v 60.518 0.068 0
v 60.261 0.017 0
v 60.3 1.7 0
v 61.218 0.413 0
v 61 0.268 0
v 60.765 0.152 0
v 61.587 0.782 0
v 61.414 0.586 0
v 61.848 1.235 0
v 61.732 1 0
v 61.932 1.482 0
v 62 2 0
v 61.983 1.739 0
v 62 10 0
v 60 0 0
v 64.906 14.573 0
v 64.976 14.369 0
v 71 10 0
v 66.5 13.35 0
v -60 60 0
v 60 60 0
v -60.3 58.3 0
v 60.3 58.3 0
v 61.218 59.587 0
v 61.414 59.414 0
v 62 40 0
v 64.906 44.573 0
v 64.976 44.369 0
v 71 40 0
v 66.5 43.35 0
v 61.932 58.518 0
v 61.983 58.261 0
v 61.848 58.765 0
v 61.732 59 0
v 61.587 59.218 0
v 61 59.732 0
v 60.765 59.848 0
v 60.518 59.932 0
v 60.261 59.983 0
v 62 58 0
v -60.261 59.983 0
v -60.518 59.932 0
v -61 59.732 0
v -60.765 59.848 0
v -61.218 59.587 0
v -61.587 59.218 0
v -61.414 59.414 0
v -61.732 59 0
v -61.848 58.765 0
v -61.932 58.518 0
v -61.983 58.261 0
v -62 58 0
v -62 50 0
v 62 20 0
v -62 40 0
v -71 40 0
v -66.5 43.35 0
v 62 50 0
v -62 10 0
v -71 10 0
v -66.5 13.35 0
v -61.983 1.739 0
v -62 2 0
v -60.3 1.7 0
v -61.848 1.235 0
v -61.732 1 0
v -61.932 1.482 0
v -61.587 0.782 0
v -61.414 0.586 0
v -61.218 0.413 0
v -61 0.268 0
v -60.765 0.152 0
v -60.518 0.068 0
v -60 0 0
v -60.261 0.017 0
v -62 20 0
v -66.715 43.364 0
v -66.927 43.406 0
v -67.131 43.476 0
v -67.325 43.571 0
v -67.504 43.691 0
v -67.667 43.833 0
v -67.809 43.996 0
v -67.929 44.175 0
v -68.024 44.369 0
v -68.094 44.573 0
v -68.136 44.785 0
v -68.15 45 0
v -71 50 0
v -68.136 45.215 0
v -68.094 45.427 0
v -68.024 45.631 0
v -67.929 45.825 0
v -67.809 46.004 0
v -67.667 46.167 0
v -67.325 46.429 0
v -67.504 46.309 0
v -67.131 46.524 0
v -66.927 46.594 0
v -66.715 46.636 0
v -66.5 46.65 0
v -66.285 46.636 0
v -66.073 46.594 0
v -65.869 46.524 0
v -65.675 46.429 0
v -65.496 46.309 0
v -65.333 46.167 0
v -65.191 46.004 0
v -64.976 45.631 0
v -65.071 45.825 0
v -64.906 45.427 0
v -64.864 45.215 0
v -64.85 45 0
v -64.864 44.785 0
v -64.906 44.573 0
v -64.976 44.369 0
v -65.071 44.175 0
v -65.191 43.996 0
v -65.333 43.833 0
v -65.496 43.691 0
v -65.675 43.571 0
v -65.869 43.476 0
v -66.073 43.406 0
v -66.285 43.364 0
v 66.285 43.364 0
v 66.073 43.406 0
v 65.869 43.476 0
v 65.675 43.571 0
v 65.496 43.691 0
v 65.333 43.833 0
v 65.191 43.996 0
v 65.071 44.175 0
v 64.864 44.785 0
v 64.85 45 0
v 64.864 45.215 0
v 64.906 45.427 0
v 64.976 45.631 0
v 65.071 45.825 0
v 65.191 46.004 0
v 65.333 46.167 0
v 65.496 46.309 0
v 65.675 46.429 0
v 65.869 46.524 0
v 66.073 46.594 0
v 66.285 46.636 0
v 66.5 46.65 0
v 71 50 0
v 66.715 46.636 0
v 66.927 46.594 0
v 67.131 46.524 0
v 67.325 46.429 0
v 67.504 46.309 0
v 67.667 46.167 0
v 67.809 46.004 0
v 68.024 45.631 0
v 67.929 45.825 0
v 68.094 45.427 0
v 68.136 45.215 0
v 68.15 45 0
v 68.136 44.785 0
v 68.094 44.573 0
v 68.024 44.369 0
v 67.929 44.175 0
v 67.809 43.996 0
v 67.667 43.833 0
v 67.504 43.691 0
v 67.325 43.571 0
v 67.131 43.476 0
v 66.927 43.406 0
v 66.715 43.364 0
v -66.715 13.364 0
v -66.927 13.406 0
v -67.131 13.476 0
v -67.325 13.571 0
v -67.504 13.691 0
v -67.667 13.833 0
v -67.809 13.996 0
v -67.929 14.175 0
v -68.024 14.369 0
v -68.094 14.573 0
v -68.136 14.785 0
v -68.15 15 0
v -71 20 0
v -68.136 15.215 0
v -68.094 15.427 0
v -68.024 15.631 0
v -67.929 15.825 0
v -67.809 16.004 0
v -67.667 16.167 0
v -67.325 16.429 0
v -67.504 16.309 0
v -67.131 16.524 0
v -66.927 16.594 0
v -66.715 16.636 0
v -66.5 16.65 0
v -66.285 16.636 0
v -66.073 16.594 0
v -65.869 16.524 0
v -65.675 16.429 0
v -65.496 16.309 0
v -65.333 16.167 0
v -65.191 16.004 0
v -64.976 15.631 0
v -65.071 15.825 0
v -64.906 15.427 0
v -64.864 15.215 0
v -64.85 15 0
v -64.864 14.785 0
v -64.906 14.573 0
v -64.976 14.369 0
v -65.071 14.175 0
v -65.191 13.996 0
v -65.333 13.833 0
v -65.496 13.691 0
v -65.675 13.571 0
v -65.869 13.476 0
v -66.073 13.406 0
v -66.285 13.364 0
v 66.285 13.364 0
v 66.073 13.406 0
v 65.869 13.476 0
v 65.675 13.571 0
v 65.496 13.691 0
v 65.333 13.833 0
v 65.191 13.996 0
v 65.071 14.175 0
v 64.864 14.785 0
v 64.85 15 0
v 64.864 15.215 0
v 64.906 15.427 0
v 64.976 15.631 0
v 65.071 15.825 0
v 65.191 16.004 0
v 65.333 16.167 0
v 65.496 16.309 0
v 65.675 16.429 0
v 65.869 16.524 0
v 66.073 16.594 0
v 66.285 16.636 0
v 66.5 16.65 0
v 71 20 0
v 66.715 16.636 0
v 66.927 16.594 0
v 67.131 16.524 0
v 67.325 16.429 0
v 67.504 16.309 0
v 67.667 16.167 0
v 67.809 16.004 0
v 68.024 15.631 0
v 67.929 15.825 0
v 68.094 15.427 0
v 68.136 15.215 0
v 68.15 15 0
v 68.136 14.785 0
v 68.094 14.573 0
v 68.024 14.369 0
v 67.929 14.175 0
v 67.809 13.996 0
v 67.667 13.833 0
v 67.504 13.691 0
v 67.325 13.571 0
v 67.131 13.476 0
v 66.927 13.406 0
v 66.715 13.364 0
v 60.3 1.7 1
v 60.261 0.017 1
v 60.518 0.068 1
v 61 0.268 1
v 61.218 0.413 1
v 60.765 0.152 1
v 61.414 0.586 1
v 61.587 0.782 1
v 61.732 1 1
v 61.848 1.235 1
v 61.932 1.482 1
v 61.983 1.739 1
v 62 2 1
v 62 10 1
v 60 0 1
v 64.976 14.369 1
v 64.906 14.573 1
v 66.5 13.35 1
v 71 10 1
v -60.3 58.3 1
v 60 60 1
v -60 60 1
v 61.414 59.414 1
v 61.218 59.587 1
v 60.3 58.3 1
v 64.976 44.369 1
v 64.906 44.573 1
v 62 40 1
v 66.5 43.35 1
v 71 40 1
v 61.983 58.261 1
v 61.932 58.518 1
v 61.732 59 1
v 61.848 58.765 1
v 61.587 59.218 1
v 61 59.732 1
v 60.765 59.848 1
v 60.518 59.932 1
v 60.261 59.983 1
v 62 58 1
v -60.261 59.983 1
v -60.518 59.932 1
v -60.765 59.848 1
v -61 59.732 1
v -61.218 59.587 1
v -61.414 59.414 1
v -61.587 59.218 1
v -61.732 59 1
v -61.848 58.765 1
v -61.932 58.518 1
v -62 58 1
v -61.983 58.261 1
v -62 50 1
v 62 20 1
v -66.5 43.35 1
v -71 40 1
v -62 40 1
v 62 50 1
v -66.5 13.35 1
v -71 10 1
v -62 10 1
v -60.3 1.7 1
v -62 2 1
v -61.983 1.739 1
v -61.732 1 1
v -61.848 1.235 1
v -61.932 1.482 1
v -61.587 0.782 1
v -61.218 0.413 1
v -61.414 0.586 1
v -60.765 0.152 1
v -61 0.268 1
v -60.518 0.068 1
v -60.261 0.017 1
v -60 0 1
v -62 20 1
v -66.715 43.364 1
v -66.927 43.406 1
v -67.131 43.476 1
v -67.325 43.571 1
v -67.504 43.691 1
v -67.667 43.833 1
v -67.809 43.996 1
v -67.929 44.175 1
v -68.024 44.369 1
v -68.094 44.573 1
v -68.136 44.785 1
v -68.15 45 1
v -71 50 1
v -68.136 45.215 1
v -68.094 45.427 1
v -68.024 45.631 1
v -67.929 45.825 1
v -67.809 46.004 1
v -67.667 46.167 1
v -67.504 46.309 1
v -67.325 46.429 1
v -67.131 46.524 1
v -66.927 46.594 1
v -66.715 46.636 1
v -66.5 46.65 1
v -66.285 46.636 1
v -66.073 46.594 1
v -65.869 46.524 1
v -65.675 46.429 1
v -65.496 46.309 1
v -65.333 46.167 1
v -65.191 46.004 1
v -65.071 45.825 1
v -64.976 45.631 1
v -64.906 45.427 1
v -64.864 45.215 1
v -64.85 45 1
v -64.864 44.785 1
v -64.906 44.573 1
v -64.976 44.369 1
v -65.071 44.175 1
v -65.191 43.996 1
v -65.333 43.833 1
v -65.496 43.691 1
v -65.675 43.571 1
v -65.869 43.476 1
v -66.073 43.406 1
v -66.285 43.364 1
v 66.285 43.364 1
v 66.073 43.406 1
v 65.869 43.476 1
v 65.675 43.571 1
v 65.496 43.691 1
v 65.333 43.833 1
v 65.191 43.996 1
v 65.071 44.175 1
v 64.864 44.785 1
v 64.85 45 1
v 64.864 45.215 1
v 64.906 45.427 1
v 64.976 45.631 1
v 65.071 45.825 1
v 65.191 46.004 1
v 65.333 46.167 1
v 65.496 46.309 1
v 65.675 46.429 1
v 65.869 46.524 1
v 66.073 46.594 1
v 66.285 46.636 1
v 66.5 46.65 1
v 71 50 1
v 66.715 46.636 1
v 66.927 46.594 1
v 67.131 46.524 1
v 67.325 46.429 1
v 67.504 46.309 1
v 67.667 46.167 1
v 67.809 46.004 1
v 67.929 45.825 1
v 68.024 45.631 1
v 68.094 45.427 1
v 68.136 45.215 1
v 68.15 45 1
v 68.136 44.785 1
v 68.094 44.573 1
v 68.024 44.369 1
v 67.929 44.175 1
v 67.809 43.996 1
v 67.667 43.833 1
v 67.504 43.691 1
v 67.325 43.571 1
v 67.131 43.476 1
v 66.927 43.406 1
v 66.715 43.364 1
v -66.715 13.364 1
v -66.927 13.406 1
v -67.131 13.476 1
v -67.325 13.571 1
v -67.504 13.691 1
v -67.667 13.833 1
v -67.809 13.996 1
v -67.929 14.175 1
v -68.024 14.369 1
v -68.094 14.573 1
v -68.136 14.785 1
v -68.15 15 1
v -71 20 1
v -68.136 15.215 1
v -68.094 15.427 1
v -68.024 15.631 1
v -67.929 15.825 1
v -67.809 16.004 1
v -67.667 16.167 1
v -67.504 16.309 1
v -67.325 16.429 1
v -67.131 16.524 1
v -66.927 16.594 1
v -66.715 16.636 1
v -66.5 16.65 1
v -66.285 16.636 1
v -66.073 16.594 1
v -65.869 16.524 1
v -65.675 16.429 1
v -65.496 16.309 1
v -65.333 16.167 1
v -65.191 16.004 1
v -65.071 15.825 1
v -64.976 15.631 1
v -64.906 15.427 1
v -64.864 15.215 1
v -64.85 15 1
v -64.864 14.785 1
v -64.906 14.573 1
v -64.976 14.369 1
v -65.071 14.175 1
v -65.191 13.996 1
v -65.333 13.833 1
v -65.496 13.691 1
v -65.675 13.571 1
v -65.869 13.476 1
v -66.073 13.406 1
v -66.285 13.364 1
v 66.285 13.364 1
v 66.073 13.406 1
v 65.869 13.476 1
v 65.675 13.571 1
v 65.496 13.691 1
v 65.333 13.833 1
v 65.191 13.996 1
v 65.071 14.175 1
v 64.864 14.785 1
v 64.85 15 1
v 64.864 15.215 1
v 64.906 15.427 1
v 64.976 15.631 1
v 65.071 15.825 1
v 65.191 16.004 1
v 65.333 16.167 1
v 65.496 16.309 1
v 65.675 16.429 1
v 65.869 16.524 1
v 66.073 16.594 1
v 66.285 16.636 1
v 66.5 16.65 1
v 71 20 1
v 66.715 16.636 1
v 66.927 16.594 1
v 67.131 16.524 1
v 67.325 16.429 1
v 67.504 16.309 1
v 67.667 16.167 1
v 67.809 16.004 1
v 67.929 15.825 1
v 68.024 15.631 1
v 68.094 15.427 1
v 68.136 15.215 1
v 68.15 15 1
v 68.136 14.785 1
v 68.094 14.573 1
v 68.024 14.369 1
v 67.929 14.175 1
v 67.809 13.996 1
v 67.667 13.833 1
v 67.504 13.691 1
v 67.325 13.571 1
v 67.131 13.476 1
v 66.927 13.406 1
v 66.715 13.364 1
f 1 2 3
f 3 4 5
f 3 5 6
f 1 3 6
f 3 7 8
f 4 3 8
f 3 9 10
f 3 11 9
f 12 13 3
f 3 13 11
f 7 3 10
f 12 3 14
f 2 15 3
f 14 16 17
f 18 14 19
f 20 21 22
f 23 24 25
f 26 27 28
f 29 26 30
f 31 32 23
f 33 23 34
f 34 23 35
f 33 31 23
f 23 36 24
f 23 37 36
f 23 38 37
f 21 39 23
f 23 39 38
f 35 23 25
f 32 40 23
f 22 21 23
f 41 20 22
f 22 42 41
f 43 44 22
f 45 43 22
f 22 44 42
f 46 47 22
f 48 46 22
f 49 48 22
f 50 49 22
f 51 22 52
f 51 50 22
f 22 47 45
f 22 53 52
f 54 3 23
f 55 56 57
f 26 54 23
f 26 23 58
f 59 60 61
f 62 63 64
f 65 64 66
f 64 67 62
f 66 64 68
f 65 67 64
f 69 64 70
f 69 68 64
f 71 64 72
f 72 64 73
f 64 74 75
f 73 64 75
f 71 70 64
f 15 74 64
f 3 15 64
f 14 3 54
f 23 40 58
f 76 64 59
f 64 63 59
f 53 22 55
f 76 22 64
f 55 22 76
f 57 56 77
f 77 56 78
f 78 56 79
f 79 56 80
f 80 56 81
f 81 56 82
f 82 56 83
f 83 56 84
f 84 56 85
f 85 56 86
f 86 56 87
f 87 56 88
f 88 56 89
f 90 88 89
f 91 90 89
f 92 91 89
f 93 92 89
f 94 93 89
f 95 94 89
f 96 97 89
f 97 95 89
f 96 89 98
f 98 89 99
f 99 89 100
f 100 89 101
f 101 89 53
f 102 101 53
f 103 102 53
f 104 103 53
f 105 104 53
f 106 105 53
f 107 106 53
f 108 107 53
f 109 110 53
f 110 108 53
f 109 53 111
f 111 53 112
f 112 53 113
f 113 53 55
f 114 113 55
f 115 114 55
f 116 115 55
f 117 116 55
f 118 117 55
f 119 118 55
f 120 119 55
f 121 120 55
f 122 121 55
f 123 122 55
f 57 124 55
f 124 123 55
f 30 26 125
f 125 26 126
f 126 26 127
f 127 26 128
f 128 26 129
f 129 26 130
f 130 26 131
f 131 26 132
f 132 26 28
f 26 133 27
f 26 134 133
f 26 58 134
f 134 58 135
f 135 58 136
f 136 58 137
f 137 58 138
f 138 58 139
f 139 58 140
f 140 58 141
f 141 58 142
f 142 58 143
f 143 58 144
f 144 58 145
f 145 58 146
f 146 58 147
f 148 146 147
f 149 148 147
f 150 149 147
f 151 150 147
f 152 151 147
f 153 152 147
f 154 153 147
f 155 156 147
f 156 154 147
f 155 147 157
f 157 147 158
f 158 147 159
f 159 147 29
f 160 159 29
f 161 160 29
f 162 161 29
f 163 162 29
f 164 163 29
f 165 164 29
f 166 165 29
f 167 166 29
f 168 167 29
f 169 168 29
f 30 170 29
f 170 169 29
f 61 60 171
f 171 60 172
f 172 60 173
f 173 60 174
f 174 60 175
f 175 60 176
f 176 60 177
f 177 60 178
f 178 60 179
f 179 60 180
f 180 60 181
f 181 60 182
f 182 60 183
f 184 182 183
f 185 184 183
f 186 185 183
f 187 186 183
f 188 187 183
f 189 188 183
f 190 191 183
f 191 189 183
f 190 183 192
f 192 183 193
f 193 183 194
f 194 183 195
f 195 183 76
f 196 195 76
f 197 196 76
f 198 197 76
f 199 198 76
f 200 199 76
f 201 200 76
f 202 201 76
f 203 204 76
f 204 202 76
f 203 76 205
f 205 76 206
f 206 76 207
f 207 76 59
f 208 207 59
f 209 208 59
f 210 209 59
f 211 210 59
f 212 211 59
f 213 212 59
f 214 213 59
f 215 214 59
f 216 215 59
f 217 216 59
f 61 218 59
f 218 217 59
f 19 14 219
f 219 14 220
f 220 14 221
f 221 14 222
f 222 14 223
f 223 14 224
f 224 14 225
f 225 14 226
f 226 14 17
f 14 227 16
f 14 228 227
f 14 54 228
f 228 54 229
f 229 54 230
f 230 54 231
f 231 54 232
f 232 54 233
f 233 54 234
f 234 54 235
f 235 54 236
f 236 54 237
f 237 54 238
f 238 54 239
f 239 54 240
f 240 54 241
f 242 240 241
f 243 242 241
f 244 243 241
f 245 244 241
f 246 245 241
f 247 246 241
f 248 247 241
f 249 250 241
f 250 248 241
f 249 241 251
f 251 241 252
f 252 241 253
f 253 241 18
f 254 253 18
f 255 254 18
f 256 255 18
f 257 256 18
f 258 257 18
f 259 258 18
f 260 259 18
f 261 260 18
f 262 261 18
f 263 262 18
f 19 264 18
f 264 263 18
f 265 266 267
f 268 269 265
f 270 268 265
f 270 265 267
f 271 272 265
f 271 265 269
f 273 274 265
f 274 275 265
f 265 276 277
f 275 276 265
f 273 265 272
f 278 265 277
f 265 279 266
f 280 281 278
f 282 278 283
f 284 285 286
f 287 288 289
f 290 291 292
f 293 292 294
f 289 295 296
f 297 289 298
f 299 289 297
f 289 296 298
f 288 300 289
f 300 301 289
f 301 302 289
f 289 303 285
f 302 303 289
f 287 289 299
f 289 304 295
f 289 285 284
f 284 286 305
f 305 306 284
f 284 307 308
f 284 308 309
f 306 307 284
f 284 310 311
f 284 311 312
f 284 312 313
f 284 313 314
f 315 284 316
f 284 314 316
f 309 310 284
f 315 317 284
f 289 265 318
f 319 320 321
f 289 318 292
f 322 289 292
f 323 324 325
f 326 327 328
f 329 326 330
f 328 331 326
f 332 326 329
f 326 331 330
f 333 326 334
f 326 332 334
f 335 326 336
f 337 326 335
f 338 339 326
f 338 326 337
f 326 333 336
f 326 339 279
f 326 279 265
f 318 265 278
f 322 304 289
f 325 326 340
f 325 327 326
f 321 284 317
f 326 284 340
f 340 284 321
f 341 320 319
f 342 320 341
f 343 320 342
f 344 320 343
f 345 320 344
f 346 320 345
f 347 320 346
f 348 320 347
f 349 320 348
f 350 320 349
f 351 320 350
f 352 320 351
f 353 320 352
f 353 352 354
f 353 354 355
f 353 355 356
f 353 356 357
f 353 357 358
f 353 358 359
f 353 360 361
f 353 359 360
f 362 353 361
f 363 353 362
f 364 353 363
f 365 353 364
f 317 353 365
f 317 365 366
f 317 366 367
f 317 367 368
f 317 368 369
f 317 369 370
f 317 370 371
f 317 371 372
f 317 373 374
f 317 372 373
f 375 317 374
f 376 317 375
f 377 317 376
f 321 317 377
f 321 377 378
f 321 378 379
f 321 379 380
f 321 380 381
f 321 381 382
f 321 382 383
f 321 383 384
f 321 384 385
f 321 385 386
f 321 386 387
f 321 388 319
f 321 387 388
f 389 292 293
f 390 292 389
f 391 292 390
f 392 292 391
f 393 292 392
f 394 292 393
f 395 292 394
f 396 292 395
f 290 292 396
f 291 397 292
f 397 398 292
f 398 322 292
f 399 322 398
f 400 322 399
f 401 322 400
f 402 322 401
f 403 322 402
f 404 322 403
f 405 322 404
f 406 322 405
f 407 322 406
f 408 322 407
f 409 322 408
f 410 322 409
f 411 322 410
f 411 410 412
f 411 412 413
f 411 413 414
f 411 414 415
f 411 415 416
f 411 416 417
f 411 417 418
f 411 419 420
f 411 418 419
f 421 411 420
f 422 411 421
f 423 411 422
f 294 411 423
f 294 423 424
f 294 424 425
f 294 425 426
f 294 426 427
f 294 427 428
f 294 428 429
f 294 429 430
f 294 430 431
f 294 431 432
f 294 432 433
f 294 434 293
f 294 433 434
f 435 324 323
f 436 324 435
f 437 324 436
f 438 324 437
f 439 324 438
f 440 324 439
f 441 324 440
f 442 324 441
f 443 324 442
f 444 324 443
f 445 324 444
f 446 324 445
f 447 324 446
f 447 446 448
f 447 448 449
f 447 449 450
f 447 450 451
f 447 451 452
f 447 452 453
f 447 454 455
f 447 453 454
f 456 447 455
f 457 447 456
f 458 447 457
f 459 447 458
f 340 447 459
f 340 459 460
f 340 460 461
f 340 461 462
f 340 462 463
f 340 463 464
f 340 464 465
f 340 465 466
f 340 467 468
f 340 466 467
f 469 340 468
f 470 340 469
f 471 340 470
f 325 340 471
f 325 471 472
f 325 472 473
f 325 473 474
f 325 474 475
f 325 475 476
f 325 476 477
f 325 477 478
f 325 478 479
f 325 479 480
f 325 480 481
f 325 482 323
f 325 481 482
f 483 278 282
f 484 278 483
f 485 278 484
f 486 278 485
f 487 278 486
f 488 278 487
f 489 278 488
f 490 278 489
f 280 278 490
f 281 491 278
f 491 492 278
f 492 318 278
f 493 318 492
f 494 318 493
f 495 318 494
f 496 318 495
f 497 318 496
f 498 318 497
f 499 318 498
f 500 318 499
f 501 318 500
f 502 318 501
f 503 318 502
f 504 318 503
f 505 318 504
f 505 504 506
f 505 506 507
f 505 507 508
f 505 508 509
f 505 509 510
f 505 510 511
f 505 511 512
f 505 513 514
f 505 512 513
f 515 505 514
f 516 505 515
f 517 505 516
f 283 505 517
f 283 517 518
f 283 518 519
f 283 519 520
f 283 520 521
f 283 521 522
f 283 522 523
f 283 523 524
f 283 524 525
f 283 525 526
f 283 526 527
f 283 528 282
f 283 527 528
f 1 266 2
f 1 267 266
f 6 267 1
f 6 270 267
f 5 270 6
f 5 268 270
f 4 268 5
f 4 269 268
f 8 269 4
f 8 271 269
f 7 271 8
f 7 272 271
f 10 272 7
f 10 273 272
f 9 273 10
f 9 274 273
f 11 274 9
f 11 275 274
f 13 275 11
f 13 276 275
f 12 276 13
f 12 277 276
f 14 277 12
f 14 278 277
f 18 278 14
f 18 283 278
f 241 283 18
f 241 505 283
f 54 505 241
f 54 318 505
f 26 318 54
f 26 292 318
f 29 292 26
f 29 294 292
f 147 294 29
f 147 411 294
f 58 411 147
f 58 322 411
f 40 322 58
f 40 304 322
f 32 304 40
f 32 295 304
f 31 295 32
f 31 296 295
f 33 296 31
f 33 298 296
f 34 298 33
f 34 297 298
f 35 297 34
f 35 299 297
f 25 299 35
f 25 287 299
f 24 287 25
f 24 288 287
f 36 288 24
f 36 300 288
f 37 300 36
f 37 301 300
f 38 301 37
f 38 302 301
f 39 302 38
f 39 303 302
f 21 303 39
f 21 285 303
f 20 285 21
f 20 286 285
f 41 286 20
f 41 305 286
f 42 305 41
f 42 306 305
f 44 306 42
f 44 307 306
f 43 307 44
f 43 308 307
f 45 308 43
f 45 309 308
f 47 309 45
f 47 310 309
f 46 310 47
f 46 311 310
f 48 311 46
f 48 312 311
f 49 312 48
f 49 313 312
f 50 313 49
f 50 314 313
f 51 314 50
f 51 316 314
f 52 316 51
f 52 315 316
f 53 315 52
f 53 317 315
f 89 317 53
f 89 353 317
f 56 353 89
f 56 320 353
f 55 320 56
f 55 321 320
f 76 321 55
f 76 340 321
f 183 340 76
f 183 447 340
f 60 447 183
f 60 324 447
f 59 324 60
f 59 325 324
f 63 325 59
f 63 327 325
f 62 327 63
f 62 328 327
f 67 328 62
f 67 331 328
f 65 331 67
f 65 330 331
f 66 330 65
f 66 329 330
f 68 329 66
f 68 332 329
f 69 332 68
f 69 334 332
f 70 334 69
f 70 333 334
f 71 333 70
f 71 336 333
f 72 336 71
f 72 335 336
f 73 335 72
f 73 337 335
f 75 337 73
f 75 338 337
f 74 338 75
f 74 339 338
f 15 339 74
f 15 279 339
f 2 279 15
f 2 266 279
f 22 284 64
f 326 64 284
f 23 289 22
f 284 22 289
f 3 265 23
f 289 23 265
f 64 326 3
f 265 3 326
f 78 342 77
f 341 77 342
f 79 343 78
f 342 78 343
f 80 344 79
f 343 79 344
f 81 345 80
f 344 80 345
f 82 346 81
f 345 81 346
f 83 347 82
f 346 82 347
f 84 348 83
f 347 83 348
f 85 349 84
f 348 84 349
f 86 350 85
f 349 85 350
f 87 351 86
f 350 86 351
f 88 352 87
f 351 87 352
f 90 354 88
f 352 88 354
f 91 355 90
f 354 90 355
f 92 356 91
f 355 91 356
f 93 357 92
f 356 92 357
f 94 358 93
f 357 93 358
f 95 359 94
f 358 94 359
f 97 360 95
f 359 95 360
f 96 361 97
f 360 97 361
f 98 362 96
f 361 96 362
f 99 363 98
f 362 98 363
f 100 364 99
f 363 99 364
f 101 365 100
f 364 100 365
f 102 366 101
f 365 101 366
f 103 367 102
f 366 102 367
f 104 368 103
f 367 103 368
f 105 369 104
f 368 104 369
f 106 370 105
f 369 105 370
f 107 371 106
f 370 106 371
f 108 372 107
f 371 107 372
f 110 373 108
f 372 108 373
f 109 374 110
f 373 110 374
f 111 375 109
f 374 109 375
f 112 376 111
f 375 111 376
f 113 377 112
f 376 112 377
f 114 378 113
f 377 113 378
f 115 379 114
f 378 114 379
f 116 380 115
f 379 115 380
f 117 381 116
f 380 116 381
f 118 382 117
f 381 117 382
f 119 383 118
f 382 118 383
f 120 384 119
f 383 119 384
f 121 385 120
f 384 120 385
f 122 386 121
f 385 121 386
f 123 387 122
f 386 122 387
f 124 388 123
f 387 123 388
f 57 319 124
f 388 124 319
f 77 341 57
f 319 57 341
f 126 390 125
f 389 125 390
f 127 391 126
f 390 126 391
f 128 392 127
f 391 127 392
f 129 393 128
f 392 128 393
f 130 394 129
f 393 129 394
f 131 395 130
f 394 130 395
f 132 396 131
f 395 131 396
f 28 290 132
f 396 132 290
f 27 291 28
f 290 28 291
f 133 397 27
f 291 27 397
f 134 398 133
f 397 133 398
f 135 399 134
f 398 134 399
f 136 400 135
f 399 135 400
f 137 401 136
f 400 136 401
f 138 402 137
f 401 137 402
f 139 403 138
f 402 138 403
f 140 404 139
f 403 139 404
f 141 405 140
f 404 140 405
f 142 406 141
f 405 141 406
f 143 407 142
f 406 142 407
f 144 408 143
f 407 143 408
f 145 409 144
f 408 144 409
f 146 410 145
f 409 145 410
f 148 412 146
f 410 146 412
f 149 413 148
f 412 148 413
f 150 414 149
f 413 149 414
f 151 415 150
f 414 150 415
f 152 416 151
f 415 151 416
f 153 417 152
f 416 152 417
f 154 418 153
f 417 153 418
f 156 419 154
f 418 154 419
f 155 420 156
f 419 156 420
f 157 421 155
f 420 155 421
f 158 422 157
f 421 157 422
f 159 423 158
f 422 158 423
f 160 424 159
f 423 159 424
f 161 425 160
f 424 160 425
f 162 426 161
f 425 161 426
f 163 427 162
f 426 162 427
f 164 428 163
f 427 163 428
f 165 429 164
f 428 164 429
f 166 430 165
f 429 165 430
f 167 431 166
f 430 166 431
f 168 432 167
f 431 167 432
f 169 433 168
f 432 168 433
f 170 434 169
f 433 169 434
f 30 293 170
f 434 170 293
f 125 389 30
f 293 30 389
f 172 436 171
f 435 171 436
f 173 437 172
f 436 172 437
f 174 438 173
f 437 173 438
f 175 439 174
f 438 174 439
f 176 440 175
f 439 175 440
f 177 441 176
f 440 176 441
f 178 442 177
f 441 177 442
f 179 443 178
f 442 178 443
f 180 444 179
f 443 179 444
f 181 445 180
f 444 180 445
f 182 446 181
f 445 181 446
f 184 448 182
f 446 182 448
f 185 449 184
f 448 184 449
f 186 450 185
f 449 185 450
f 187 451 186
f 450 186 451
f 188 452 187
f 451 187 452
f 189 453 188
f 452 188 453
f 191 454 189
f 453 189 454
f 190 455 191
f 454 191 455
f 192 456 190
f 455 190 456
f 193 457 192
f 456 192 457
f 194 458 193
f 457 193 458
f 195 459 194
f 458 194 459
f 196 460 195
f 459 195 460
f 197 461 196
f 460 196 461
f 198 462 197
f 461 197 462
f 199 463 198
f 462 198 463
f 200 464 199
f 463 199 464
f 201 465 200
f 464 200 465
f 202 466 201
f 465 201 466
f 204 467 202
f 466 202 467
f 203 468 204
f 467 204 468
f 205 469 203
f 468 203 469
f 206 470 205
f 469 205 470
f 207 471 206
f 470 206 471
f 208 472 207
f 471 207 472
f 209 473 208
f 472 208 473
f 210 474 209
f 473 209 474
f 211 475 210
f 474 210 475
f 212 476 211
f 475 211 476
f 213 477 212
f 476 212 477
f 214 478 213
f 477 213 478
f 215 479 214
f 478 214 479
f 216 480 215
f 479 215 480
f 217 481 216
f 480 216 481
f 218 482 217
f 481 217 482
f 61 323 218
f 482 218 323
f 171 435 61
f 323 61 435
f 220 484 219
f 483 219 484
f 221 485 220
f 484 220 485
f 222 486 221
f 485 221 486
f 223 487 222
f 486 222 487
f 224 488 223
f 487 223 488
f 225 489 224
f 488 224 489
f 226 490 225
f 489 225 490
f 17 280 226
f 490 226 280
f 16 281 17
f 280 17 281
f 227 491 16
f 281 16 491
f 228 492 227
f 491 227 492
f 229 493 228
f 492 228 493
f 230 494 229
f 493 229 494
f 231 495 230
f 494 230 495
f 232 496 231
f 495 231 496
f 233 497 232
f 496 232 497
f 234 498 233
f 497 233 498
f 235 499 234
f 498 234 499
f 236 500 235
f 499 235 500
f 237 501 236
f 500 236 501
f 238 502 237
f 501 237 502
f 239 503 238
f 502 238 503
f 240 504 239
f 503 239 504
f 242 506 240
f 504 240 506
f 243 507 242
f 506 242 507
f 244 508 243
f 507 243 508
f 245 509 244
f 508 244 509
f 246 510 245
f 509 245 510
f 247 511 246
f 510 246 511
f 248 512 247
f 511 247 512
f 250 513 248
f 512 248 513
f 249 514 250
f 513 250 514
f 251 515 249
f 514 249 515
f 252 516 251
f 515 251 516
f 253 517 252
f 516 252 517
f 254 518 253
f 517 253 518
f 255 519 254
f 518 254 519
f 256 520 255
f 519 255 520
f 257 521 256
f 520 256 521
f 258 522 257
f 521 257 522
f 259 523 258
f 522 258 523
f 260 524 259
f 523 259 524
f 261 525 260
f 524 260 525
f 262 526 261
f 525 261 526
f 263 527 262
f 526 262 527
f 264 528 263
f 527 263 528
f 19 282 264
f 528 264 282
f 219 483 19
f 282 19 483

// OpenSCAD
// file: lunchbox.params.scad
// SPDX-FileCopyrightText: 2026 Alon A. Rabinowitz
// SPDX-License-Identifier: CC-BY-SA-4.0
// A remix of LunchBox by GekoPrime (https://www.printables.com/model/468166), CC BY-SA 4.0.

/*
Everything you SET for the LunchBox remix. Render lunchbox.scad, not this file.

The LunchBox is a carbon + HEPA scrubber. Air enters the grid on the body's front and passes the HEPA paper,
then the carbon bed between two perforated walls. It goes down a channel at the back to the fan section
underneath, whose fans blow it out at the front. This remix adds, for a build with two 40 x 40 x 20 fans
(Delta EFB0412VHD):

  insert      a drop-in section between the body and the fan section, holding a flat filter sheet that
              stops carbon dust reaching the fans. It mates with the unmodified parts on both faces.
  gaskets     flat TPU, one for the lid joint and one for each joint at the fans.
  blank       closes the fan section's middle bay.
  tabs        two per short end at every joint, clamped with an M3 screw and a nut in a side slot. The
              body, the lid and the fan section get them added to the original STLs.

COORDINATES are the box as it stands: X along its length, Y from the front (the grid, where air comes in)
to the back, Z up, with Z = 0 at the joint between the body and the fan section. X is centred.

The original's STLs use a different frame (Z points down, Y from the front towards -Y) and are not in
this repository; lunchbox.layout.scad maps them into this one. Download them from the Printables page into
original/ - see the README there.
*/

/* [Which part] */
part = "insert";   /* "insert", "gasket-lid", "gasket-fans", "blank", "body", "lid" or "fans". The last three are the originals with tabs added, and need original/. lunchbox-assembly.scad shows them together. */
insert_tabs = true;   /* false makes the insert a plain drop-in, for a LunchBox built without tabs. */
/* [The original LunchBox - measured by sectioning its STLs, 6-7 Oct 2026] */
// All MEASURED: horizontal sections of filter_caddy_110x74x21.stl (the body), filter_lid_110x74x21.stl and
// axial_fan_caddy_40x28.stl (the fan section), read to 0.1 mm. The originals agree with each other to that
// precision (the outlines are identical), so the numbers are the author's design values.
lb_l    = 124;      /* Outside length (X). */
lb_d    = 60;       /* Outside depth (Y). */
lb_r    = 2;        /* The outline's corner radius. */
lb_wall = 2;        /* The body's wall; the lid's plug fills the inside of it, 120 x 56. */
body_h  = 117.43;   /* The body, from the fan joint to the lid joint. */
lid_t   = 2;        /* The lid's plate. Its plug, lid_t more, sits inside the body's top. */
lid_screw_ys = [5, 55];   /* The lid's own two screws, at X = 0. They stay. */
groove_w = 2.6;     /* The channel in the body's bottom face, inside its wall, that the fan section's lip seats in... */
groove_h = 2;       /* ...and its depth. */
hepa_hw  = 55;      /* The HEPA holder's opening in the body's bottom face: X +/-55, from the wall to Y = hepa_y1. */
hepa_y1  = 23;
cap_y1   = 41.1;    /* The carbon bed's floor, at the body's bottom face, ends here; behind it is the channel that takes the air down to the fans. */
fans_h   = 44.6;    /* The fan section, from its bottom to the rim the body sits on. Its lip stands groove_h higher. */
fans_floor = 4;     /* The fan section's floor, under the fans. */
fan_slot_hw = 60.3; /* The slot the three fans stand in, side by side: X +/-60.3 ... */
fan_slot_y1 = 30.6; /* ...from the front wall (Y = lb_wall) to here, where the walls step in. Behind it, the plenum with its curved floor. */
plenum_hw   = 58;   /* The plenum's opening in the rim, X +/-58, from fan_slot_y1 to lip_back_y0. */
lip_t_side  = 1.7;  /* The fan section's lip: along each side, X 58 to 59.7, from fan_slot_y1 back... */
lip_back_y0 = 55.7; /* ...and across the back, Y 55.7 to 57.7, its two outer corners rounded to lb_r. It rises groove_h above the rim. */
lip_t_back  = 2;

/* [The insert and its filter sheet] */
sheet_t  = 5;       /* The space the sheet lies in. Polyester filter floss, about 5 mm loose; it is not compressed. */
plenum_h = 5;       /* Free air above the sheet: the channel is only 14 mm deep, and this lets its air spread forward over the whole sheet. */
grid_t   = 2;       /* The grid the sheet lies on. */
grid_pitch = 10;    /* Ribs along Y, this far apart; two more ribs cross them along X. */
grid_beads = 2;     /* Each rib is this many beads wide. */
ledge_beads = 3;    /* A ledge round the cavity at the grid's level: the ribs end on it, and the sheet's edges seal on it. */

/* [The gaskets - TPU] */
gasket_t = 1.0;     /* Five layers. Every joint's stack height counts it, uncompressed. */

/* [The tabs and their screws] */
tab_ys    = [15, 45];   /* The two tabs on each short end, by Y. Alon, Q81, 7 Oct 2026: two per side. */
tab_l     = 9;      /* How far a tab stands out from the end wall. */
tab_w     = 10;     /* Its width, along Y. */
tab_t     = 6;      /* Its height, on the body and the fan section. The lid's tab is the lid's plate. */
tab_axis  = 4.5;    /* The screw, this far out from the end wall: the nut's slot then stops about 1 mm short of it. */
screw_d   = 3.0;    /* M3. */
nut_af    = 5.5;    /* The M3 hex nut, across its flats - ISO 4032... */
nut_h     = 2.4;    /* ...and its height, the largest allowed. */
nut_fit   = 0.15;   /* The nut's side slot, per side, on top of fdm_hole_comp: the nut slides in and the screw holds it. */
screw_tip = 1.5;    /* A screw must stand this far out of its nut. */
screw_lengths = [8, 10, 12, 16, 20, 25, 30, 35, 40];   /* M3 lengths to choose from. */

/* [The blank for the middle bay] */
blank_fit = 0.2;    /* Less than the bay, per side, in X and in depth. The fans beside it are 40 mm on the nose. */
blank_face = 2;     /* Its front face, which closes the bay. */
blank_beads = 3;    /* Its side walls. */

/* [Printing - mirrors the print profile; scad-check.sh compares the first two with the slicer's] */
fdm_layer_h     = 0.2;
fdm_extrusion_w = 0.45;
fdm_hole_comp   = 0.15;   /* Added to every hole's radius - fdm-design-rules section 2. Not cross-checked. */
// main file
// SPDX-FileCopyrightText: 2026 Alon A. Rabinowitz
// SPDX-License-Identifier: CC-BY-SA-4.0
// A remix of LunchBox by GekoPrime (https://www.printables.com/model/468166), CC BY-SA 4.0.

// The lid's gasket, in TPU, on its own: everything is in lunchbox.scad, and this file only pins the part.
include <lunchbox.scad>
part = "gasket-lid";
